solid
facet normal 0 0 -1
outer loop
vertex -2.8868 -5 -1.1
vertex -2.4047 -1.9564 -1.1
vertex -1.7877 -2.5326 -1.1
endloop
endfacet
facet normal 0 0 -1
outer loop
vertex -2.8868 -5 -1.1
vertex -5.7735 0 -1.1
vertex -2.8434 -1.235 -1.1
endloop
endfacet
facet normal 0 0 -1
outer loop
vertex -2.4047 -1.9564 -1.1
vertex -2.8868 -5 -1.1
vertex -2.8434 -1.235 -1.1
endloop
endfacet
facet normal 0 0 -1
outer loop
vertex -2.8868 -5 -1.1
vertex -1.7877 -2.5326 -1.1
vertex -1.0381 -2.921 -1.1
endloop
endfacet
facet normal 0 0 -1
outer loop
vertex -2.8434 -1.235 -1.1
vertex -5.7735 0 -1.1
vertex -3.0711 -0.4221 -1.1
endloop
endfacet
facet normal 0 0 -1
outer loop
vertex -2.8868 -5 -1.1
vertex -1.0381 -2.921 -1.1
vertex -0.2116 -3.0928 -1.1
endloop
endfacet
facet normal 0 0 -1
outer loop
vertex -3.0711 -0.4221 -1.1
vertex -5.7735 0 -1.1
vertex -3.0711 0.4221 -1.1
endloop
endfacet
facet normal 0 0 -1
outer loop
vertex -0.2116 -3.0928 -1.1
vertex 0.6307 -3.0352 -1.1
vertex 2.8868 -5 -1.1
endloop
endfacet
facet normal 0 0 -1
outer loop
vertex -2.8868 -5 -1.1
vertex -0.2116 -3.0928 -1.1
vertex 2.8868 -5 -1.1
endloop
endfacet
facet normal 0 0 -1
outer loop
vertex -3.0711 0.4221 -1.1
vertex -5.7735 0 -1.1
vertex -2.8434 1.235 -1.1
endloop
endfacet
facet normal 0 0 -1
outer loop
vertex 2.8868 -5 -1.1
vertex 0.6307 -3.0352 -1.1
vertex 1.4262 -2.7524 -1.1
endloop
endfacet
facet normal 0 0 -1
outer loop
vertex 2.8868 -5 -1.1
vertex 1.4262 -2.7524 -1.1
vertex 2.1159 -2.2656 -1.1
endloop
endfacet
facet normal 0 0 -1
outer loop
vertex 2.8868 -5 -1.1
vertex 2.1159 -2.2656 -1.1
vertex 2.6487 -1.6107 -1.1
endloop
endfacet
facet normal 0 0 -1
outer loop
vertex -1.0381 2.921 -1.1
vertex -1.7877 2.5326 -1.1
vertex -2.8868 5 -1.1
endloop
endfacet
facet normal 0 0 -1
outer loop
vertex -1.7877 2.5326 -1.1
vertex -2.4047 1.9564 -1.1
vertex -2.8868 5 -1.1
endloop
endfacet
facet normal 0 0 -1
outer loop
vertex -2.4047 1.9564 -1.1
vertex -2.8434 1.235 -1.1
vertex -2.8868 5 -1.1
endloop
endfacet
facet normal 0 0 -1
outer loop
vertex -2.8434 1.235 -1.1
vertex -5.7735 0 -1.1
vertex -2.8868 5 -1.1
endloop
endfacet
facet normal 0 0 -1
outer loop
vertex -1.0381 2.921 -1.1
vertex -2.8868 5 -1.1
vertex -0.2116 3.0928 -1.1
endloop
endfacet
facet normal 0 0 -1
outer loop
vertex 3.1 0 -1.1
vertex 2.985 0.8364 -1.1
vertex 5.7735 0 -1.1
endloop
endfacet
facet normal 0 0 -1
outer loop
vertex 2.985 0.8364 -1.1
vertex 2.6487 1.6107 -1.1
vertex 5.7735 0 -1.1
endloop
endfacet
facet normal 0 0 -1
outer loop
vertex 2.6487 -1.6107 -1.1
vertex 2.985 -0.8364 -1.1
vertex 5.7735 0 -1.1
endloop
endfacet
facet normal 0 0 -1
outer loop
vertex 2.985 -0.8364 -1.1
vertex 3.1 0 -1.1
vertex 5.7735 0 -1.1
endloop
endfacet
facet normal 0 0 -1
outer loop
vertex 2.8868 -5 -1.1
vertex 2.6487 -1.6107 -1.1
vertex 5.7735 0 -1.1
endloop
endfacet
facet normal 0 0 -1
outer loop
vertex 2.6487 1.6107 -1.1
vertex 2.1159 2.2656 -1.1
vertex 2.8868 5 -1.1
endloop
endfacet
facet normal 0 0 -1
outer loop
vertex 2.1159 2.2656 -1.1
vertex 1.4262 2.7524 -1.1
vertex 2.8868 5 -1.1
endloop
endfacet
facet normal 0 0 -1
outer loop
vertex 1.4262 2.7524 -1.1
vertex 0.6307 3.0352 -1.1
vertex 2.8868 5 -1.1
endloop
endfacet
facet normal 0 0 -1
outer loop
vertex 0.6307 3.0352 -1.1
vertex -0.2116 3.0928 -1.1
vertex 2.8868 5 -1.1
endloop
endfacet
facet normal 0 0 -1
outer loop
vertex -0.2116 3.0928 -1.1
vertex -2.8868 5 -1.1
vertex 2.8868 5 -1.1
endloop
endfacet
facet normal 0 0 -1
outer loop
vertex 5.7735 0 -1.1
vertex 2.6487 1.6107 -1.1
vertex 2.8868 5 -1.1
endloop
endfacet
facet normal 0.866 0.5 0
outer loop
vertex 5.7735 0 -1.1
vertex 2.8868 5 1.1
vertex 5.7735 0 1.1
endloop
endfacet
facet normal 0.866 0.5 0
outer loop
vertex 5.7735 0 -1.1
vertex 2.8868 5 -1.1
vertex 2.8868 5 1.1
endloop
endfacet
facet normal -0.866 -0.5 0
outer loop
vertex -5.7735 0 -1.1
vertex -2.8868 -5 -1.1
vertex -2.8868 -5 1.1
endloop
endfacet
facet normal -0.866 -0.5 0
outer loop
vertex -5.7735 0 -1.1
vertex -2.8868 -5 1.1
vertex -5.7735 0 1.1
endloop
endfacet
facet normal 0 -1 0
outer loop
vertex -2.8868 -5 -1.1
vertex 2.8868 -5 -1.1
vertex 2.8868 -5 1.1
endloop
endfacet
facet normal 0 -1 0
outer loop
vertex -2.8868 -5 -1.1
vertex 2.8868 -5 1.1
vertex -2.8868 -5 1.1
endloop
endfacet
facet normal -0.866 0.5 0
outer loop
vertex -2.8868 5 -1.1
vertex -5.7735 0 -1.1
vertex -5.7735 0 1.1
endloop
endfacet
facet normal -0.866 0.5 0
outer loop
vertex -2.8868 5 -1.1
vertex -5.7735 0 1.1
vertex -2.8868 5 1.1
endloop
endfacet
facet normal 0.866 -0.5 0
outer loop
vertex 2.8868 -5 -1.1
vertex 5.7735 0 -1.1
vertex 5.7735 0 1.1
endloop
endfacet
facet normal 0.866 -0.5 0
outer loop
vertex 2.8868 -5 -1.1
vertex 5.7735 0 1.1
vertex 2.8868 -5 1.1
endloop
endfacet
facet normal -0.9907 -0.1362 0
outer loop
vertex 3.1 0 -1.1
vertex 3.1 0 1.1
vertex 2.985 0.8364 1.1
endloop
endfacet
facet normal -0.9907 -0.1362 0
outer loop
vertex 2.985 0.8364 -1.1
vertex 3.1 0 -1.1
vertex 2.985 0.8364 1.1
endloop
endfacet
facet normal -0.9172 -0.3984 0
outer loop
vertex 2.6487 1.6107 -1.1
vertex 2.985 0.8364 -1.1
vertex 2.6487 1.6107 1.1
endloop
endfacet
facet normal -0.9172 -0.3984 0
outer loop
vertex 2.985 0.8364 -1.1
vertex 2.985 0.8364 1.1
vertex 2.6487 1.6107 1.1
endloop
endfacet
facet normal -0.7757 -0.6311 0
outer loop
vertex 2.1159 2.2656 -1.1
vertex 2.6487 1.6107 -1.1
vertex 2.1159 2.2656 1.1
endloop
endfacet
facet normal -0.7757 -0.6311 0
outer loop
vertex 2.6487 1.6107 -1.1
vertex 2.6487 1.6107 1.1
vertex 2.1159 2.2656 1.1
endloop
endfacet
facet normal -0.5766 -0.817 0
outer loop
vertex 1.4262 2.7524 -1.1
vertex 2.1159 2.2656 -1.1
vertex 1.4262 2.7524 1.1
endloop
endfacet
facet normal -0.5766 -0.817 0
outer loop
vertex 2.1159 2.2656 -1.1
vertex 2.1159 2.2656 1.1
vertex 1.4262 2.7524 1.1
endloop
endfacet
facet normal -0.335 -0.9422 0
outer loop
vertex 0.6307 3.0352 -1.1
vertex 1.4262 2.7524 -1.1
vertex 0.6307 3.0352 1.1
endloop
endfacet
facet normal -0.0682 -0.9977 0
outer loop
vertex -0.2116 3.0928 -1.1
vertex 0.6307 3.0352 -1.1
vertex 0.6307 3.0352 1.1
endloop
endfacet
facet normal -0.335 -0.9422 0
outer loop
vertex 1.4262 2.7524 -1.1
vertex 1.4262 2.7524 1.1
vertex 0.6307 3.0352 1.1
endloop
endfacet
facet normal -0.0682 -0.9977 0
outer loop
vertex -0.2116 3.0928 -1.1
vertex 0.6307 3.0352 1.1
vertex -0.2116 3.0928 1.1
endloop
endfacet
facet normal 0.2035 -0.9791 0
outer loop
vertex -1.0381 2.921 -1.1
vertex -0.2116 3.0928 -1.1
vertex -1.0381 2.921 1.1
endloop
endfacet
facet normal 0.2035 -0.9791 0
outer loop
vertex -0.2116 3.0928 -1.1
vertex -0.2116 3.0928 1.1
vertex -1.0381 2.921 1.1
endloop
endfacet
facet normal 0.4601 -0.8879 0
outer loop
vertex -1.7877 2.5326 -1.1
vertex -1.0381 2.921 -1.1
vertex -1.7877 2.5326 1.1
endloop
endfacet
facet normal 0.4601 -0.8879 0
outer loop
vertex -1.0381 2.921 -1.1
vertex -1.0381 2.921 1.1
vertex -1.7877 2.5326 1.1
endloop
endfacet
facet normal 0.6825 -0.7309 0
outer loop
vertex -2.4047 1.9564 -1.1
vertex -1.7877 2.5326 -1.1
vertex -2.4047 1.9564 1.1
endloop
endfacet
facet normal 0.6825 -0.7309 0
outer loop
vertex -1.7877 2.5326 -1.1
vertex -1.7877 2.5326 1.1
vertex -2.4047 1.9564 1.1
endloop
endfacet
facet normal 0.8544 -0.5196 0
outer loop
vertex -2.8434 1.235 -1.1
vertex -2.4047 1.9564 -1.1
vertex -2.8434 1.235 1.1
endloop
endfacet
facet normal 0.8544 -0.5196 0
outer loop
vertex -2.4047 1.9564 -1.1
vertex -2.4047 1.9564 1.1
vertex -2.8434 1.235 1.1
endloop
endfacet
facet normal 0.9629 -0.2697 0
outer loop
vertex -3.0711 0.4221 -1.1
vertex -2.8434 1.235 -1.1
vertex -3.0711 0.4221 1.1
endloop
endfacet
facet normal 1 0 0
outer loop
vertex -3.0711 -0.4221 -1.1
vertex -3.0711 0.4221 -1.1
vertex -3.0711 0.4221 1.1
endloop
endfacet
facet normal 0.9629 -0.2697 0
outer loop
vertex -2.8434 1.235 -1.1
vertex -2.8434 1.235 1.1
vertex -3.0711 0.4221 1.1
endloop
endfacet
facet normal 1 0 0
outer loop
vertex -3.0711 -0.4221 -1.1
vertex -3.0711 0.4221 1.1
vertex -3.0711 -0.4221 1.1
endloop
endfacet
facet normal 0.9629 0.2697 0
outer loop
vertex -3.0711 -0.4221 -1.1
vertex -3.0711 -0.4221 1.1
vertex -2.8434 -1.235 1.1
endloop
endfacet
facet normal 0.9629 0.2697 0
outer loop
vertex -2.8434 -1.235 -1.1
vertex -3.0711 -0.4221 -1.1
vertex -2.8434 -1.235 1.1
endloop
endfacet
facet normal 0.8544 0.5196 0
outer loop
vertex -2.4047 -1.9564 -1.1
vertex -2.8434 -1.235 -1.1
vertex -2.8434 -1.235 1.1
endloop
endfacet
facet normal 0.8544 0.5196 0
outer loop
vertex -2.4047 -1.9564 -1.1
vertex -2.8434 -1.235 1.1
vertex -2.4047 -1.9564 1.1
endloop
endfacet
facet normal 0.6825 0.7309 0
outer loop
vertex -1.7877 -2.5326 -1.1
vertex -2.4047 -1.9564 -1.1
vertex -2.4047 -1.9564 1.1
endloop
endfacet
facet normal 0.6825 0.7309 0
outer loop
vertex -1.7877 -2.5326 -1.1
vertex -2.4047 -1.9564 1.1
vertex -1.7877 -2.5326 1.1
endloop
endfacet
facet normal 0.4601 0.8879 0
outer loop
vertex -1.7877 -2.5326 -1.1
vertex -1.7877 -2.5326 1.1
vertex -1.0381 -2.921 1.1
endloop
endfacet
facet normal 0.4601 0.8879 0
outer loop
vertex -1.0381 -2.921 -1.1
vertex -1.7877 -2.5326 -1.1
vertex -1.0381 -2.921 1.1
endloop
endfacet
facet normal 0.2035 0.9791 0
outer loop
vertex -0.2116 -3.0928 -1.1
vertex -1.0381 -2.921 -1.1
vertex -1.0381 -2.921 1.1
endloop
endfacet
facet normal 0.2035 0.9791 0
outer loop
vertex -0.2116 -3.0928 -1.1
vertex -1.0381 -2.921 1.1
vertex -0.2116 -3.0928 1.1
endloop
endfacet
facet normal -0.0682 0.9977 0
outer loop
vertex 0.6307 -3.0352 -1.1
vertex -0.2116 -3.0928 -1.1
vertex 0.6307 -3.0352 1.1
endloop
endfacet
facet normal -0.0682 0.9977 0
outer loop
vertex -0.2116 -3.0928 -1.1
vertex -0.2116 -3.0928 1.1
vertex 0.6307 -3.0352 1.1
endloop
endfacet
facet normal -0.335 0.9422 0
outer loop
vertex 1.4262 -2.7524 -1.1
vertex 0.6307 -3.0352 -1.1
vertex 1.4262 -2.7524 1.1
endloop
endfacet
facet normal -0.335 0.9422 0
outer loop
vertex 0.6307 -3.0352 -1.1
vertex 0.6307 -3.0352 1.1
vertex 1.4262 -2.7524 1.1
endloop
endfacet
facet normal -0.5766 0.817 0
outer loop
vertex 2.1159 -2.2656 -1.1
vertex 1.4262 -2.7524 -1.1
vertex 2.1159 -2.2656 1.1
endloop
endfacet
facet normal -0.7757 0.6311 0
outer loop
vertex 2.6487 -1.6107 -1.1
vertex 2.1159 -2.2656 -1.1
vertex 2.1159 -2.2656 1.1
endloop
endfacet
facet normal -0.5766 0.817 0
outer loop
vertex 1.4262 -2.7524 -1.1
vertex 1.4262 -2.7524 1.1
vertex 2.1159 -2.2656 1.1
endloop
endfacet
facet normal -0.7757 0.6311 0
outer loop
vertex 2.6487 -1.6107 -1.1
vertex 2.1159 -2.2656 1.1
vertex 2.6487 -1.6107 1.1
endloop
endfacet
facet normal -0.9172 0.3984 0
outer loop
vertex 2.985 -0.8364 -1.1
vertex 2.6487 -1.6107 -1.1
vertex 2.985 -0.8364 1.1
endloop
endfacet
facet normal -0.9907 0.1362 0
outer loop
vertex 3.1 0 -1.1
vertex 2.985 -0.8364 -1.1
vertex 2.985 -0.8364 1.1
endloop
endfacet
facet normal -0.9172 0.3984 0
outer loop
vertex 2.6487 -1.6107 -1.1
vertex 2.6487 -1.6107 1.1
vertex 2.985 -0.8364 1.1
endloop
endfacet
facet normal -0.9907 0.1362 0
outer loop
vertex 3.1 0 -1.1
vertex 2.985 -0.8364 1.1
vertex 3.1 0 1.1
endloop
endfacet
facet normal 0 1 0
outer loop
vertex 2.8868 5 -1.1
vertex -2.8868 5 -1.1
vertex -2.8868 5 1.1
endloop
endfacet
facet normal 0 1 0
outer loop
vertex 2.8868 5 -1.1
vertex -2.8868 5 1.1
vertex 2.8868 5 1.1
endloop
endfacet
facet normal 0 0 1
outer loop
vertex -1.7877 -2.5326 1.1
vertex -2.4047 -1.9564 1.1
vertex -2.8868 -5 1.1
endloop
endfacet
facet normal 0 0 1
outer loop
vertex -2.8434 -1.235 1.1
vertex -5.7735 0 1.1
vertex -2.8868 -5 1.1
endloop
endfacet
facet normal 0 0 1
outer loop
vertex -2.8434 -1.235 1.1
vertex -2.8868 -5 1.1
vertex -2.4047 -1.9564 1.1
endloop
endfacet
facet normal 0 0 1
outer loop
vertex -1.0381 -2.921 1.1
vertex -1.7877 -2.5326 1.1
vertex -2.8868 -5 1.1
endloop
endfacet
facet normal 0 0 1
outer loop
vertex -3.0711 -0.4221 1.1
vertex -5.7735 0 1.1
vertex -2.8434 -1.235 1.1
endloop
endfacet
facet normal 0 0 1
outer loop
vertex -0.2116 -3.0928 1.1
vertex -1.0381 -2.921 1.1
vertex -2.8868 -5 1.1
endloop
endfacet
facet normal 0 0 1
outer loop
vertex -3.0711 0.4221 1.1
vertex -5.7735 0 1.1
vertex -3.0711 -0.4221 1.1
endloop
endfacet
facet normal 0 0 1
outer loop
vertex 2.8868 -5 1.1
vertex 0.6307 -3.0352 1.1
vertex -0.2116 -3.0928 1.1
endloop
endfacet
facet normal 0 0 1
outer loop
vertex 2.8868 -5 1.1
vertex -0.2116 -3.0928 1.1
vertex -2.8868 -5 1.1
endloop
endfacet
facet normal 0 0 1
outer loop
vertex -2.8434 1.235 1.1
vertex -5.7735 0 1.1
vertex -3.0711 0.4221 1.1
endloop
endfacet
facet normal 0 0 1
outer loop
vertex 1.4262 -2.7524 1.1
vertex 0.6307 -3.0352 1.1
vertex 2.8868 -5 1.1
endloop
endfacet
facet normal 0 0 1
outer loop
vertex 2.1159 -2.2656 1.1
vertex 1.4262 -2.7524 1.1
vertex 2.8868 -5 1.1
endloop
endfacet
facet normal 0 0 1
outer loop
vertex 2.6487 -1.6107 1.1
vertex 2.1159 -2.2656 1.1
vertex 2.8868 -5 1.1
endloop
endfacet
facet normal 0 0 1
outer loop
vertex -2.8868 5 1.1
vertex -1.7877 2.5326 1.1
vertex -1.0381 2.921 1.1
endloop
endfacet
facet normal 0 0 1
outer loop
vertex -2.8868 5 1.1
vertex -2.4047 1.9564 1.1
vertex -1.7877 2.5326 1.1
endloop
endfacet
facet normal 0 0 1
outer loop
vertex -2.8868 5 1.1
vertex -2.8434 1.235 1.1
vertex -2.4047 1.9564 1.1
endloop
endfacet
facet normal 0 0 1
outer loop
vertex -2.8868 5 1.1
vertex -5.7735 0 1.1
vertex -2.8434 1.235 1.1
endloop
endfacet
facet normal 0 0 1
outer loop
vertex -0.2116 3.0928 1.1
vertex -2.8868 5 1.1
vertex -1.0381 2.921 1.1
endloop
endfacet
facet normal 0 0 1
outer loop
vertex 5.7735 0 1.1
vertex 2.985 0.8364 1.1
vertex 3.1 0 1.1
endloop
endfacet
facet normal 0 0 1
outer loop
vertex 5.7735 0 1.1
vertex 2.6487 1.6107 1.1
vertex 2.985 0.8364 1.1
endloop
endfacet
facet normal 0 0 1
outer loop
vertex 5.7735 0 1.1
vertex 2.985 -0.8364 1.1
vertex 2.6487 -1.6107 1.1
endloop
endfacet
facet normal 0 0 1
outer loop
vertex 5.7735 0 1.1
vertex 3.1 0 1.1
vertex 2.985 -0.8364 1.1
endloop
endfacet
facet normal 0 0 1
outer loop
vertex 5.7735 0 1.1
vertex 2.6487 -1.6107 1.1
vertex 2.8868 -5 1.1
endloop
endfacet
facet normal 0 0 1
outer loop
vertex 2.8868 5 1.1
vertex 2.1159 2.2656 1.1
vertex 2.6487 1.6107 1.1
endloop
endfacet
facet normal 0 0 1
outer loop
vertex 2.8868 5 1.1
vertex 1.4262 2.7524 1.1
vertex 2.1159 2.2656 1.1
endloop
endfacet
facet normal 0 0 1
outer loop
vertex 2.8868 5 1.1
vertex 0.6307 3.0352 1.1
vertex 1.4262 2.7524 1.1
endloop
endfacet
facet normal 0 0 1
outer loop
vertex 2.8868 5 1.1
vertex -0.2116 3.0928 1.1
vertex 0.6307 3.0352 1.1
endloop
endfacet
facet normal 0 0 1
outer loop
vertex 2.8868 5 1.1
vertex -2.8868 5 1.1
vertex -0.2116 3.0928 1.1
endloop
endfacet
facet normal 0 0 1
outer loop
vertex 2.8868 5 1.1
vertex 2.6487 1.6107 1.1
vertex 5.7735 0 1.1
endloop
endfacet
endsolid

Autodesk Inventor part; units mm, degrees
ref_plane "YZ Plane" through (0, 0, 0) normal (1, 0, 0) x (0, 1, 0)
ref_plane "XZ Plane" through (0, 0, 0) normal (0, 1, 0) x (-1, 0, 0)
ref_plane "XY Plane" through (0, 0, 0) normal (0, 0, 1) x (1, 0, 0)
sketch "Sketch1" plane through (0, 0, 0) normal (0, 0, 1) x (1, 0, 0)
  line L0 (2.8868, 5) -> (5.7735, 0)
  line L1 (5.7735, 0) -> (2.8868, -5)
  line L2 (2.8868, -5) -> (-2.8868, -5)
  line L3 (-2.8868, -5) -> (-5.7735, 0)
  line L4 (-5.7735, 0) -> (-2.8868, 5)
  line L5 (-2.8868, 5) -> (2.8868, 5)
  point P0 (0, 0)
  point P1 (0, 0)
  dimension "d0" = 10
extrude "Extrusion1" add sketch "Sketch1" along normal mid plane 2.2
sketch "Sketch2" plane through (0, 0, 1.1) normal (0, 0, 1) x (1, 0, 0)
  circle A0 centre (0, 0) radius 3.1
  dimension "d3" = 6.2
extrude "Extrusion2" cut sketch "Sketch2" against normal through all
sketch "Sketch3" plane through (0, 0, 0) normal (1, 0, 0) x (0, 1, 0)
  line L0 (3.1, -1.1) -> (3.1, -1.6889)
  line L1 (3.1, -1.1) -> (3.61, -1.3944)
  line L2 (3.61, -1.3944) -> (3.1, -1.6889)
  line L3 (3.1, -1.1) -> (3.61, -1.3944)
  line L4 (3.1, -1.6889) -> (3.1, -1.1)
  point P0 (0, 0)
properties part number "Porca Potenciometro"
